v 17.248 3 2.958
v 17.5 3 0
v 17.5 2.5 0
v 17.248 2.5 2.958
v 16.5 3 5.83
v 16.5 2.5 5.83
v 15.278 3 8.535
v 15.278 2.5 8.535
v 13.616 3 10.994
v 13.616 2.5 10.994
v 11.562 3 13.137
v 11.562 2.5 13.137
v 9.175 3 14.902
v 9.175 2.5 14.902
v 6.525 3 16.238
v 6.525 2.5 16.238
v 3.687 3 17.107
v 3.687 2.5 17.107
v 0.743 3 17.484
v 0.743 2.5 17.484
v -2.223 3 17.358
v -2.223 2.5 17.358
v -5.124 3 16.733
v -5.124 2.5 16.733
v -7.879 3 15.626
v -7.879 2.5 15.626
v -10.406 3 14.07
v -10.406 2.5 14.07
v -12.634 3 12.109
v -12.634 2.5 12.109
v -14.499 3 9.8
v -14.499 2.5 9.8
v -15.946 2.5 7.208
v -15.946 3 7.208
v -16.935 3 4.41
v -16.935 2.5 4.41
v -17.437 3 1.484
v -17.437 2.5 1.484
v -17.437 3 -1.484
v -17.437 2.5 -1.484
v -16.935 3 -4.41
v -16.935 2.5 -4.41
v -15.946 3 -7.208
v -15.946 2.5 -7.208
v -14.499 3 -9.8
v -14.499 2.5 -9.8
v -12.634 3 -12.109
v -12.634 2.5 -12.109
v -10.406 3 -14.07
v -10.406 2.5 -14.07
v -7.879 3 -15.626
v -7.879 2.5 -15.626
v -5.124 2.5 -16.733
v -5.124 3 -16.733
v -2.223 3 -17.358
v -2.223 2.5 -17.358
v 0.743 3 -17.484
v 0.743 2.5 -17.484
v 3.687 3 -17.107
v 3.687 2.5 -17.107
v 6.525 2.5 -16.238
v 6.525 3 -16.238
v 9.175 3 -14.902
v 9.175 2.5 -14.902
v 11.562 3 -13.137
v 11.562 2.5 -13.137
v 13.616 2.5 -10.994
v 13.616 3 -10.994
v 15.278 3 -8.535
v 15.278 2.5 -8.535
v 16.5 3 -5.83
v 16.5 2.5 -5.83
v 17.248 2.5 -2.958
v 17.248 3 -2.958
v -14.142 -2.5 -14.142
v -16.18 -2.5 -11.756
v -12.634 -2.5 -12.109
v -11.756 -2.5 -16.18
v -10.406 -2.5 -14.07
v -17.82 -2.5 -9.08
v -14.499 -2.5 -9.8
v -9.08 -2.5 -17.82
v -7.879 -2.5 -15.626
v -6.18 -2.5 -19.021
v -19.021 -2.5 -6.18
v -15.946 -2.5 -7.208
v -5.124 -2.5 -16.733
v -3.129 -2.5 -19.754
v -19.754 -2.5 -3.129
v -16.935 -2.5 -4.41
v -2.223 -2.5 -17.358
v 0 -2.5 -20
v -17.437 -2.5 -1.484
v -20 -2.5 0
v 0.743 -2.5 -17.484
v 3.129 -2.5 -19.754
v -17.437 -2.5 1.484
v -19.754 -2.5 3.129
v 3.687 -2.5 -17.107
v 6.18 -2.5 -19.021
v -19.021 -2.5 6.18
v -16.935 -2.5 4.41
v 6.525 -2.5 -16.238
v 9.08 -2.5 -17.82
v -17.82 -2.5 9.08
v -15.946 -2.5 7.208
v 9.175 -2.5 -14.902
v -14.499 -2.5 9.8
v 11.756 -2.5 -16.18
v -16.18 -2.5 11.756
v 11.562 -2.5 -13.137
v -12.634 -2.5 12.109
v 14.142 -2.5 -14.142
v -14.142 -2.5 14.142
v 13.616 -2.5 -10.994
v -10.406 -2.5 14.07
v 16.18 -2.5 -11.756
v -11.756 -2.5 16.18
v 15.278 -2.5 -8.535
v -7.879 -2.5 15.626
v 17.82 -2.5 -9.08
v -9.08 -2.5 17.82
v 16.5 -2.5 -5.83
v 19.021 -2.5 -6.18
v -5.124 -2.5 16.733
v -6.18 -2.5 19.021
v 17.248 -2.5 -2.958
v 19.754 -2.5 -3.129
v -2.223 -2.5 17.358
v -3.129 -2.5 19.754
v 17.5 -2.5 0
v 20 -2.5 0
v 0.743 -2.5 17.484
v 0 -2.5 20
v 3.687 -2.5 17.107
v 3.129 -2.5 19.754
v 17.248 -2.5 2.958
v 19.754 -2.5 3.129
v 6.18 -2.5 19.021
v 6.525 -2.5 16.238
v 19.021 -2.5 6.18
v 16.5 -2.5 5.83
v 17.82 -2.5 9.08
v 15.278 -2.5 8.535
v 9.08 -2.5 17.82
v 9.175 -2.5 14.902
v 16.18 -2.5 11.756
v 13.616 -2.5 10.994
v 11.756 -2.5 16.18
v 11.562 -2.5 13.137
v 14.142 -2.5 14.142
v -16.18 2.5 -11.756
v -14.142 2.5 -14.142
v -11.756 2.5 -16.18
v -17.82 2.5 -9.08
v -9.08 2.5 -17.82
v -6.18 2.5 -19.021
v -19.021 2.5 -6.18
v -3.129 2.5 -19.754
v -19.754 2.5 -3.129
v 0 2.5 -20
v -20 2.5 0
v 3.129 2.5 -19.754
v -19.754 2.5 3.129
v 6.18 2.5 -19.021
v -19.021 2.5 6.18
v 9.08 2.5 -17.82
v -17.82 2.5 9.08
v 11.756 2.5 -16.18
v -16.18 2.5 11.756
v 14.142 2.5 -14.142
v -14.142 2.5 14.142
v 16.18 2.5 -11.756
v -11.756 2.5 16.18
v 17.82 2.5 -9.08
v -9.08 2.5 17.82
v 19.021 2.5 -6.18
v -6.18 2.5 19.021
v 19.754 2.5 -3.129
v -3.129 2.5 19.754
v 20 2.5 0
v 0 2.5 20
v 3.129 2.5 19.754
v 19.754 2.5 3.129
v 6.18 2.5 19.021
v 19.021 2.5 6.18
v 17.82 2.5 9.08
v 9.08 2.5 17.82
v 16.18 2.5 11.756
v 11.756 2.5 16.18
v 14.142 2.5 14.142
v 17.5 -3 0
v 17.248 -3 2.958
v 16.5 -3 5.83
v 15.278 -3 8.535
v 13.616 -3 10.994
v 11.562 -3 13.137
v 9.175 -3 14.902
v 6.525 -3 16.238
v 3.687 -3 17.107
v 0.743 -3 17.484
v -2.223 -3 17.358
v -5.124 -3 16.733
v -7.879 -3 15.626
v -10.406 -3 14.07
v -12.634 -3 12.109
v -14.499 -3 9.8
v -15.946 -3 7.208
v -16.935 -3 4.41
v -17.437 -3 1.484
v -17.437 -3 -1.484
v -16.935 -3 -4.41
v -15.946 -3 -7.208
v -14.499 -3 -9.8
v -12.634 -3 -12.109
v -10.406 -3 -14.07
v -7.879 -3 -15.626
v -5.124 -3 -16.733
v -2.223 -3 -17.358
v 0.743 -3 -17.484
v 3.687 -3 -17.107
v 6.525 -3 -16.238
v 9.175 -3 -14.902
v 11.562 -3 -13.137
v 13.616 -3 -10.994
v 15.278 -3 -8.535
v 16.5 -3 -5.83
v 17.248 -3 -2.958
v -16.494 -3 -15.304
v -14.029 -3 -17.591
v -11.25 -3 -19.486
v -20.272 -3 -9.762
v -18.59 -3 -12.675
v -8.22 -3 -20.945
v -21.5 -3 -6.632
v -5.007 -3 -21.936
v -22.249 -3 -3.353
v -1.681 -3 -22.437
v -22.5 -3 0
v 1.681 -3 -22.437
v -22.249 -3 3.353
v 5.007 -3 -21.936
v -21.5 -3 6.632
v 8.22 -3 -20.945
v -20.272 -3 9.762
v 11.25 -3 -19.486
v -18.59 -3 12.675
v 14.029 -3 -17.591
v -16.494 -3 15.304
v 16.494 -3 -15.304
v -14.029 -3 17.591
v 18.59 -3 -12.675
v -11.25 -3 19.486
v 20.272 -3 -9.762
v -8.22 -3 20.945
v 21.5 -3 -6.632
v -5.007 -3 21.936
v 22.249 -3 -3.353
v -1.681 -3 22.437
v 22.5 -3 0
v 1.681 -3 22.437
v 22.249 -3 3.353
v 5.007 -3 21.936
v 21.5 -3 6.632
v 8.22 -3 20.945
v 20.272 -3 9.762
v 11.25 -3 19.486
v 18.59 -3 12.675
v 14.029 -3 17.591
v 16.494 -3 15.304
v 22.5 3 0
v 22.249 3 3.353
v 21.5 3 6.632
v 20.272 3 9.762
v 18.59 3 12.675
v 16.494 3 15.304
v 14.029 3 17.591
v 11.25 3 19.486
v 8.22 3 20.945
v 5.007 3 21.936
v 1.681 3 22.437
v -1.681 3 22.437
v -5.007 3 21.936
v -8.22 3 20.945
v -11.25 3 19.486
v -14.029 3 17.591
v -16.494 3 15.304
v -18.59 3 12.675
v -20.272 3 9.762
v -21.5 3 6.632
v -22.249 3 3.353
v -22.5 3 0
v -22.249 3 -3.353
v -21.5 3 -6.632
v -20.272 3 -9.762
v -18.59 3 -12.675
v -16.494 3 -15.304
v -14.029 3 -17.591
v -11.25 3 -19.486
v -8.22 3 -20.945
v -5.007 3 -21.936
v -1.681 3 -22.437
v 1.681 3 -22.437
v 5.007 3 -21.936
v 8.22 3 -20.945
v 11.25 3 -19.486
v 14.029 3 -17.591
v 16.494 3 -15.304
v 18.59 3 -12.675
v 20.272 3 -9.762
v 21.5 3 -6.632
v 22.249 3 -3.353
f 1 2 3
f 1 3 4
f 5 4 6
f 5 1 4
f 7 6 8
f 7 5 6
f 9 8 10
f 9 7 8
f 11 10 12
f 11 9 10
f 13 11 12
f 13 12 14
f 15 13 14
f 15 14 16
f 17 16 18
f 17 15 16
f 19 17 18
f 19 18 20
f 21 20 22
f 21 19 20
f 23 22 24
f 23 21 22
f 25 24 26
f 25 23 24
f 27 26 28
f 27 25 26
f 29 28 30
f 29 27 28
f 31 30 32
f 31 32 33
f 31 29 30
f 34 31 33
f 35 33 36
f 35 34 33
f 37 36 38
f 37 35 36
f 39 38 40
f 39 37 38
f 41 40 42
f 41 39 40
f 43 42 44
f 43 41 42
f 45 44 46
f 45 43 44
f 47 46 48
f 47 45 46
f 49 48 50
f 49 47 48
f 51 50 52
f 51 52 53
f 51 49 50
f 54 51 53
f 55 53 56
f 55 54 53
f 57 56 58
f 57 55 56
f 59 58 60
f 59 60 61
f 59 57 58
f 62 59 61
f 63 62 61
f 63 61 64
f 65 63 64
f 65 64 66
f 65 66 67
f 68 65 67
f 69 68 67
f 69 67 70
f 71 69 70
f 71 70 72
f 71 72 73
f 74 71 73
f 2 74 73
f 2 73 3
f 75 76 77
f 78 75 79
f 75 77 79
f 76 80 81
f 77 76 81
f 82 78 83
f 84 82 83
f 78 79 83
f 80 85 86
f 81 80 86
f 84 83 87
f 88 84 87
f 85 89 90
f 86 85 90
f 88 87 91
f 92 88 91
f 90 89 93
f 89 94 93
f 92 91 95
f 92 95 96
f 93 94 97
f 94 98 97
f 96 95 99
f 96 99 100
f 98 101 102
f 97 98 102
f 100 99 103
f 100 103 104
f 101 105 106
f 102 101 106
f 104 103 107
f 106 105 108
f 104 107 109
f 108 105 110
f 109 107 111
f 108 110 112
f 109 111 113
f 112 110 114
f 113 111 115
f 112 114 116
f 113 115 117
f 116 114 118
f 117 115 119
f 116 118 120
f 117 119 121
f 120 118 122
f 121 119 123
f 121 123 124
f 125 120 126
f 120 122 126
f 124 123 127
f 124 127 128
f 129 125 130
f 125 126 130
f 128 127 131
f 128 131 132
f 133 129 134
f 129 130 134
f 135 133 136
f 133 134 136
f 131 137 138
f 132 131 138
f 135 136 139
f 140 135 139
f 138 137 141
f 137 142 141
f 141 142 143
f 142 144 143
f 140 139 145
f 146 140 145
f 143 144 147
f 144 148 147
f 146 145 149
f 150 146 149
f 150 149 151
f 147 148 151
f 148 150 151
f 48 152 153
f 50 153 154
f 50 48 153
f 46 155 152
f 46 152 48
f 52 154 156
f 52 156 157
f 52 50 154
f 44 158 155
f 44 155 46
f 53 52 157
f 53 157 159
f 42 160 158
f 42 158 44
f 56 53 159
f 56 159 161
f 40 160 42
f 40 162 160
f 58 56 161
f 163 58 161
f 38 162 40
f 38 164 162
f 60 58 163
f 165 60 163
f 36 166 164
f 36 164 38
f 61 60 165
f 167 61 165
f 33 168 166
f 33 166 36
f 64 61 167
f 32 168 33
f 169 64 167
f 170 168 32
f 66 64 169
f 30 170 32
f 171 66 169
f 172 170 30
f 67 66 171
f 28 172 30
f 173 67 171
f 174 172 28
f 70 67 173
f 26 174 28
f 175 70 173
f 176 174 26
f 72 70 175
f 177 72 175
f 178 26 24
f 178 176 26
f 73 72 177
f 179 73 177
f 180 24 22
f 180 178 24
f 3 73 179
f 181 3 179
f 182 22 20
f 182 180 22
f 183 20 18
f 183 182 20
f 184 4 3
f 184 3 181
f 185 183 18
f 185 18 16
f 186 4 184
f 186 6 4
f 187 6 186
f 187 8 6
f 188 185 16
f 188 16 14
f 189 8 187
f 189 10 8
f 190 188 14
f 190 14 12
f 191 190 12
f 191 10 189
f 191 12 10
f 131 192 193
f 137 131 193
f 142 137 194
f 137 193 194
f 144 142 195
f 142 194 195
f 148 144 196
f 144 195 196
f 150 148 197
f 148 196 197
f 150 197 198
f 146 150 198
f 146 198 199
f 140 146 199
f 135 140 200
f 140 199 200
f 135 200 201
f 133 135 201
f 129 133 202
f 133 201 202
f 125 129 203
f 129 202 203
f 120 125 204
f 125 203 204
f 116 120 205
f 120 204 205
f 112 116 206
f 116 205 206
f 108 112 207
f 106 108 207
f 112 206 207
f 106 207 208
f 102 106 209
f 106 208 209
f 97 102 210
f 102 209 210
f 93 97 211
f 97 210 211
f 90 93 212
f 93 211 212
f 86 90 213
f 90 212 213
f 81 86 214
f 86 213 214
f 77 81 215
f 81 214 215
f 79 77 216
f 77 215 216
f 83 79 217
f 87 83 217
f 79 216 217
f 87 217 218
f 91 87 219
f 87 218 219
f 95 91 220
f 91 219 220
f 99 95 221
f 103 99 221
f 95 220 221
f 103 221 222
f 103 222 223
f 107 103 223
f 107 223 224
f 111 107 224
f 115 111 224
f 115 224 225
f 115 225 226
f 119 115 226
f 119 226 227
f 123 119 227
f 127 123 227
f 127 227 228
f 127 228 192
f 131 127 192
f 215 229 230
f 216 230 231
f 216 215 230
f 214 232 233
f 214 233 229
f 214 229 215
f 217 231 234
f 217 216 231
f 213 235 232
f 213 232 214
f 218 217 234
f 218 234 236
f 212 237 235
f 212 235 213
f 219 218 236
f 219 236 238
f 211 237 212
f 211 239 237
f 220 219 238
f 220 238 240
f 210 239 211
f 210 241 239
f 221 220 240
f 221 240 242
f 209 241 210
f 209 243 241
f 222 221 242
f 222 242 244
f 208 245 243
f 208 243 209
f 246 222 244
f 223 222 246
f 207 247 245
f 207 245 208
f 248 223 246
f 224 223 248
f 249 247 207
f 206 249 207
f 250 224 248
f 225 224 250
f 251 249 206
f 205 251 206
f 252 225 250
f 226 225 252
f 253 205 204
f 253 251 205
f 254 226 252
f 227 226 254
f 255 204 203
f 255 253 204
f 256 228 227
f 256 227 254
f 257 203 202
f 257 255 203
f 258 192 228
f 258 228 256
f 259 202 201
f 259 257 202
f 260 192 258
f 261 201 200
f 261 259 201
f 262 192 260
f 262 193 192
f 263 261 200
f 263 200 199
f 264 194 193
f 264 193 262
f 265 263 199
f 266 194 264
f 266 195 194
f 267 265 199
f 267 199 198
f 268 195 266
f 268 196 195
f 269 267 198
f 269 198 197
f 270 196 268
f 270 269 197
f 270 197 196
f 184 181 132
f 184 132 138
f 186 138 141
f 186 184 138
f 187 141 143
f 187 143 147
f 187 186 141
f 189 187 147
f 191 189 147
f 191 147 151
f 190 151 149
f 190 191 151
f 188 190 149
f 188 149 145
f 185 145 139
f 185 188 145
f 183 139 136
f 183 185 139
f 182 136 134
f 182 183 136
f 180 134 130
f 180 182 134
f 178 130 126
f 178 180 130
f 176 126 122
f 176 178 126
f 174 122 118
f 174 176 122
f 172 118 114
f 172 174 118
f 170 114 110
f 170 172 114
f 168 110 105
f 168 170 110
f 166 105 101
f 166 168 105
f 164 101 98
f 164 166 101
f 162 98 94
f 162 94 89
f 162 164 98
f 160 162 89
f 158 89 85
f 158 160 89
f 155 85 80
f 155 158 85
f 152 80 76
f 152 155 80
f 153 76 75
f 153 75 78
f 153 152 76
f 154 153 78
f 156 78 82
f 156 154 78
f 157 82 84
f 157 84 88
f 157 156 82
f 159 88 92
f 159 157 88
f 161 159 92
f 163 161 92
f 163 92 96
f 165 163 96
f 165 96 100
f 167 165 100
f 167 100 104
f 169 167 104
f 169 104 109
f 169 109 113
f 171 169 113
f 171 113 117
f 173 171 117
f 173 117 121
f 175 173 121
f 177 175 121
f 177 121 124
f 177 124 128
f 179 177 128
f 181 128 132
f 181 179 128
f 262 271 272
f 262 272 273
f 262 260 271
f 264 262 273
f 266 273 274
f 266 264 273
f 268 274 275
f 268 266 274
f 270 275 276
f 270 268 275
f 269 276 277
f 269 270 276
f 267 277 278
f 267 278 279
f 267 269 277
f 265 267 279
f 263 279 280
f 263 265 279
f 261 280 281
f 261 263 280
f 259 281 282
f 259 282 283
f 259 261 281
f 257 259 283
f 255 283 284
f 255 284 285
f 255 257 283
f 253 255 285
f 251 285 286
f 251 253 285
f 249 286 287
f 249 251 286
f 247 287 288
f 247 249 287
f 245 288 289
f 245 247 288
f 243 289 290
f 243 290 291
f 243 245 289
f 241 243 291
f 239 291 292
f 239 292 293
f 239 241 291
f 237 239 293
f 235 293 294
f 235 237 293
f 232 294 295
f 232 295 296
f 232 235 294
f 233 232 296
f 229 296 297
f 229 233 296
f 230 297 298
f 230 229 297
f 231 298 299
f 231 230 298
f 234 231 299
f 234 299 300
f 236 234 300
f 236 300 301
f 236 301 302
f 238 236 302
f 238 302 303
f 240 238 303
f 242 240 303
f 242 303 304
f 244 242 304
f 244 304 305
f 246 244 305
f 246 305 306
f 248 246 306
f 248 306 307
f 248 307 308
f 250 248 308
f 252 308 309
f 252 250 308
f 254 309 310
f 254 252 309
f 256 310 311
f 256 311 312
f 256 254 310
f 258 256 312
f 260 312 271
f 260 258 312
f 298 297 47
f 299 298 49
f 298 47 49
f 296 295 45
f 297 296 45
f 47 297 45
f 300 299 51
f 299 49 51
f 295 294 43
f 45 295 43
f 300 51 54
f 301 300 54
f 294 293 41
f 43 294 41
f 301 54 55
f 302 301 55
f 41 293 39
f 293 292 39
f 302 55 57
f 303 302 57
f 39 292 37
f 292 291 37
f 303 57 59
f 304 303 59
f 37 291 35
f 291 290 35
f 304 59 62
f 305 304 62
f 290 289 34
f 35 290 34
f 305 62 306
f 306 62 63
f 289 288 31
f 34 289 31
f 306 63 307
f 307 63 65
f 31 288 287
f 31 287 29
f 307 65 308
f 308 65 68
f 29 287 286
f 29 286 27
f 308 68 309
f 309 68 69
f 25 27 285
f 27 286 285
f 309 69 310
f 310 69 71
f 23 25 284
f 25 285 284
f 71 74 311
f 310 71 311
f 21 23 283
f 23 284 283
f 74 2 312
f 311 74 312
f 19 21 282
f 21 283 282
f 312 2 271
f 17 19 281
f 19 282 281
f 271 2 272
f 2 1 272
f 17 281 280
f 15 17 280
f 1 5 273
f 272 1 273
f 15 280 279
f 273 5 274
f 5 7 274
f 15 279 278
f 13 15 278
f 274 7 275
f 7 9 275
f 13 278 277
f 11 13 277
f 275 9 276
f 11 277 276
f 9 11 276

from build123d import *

# Parameters (mm, degrees)
F0_R     = 22.5
F0_R_2   = 20
F1_DEPTH = 3
F2_R     = 20
F2_R_2   = 17.5
F3_DEPTH = 0.5


# Not quite as in the source:
# - a pattern or mirror of a feature is missing from the dataset's text; its kind, count and spacing are read off the source's solid


with BuildPart() as f1:
    # F0 (on Front) → F1 (new body, symmetric)
    with BuildSketch(Plane.XZ):
        Circle(F0_R)
        Circle(F0_R_2, mode=Mode.SUBTRACT)
    extrude(amount=F1_DEPTH, both=True)

    # F2 (on face) → F3 (join)
    with BuildSketch(Plane.XZ.offset(3)):
        Circle(F2_R)
        Circle(F2_R_2, mode=Mode.SUBTRACT)
    f3 = extrude(amount=-F3_DEPTH)

    # F3_copies: F3 across plane
    add(f3.mirror(Plane.ZX))


solid = f1.part
